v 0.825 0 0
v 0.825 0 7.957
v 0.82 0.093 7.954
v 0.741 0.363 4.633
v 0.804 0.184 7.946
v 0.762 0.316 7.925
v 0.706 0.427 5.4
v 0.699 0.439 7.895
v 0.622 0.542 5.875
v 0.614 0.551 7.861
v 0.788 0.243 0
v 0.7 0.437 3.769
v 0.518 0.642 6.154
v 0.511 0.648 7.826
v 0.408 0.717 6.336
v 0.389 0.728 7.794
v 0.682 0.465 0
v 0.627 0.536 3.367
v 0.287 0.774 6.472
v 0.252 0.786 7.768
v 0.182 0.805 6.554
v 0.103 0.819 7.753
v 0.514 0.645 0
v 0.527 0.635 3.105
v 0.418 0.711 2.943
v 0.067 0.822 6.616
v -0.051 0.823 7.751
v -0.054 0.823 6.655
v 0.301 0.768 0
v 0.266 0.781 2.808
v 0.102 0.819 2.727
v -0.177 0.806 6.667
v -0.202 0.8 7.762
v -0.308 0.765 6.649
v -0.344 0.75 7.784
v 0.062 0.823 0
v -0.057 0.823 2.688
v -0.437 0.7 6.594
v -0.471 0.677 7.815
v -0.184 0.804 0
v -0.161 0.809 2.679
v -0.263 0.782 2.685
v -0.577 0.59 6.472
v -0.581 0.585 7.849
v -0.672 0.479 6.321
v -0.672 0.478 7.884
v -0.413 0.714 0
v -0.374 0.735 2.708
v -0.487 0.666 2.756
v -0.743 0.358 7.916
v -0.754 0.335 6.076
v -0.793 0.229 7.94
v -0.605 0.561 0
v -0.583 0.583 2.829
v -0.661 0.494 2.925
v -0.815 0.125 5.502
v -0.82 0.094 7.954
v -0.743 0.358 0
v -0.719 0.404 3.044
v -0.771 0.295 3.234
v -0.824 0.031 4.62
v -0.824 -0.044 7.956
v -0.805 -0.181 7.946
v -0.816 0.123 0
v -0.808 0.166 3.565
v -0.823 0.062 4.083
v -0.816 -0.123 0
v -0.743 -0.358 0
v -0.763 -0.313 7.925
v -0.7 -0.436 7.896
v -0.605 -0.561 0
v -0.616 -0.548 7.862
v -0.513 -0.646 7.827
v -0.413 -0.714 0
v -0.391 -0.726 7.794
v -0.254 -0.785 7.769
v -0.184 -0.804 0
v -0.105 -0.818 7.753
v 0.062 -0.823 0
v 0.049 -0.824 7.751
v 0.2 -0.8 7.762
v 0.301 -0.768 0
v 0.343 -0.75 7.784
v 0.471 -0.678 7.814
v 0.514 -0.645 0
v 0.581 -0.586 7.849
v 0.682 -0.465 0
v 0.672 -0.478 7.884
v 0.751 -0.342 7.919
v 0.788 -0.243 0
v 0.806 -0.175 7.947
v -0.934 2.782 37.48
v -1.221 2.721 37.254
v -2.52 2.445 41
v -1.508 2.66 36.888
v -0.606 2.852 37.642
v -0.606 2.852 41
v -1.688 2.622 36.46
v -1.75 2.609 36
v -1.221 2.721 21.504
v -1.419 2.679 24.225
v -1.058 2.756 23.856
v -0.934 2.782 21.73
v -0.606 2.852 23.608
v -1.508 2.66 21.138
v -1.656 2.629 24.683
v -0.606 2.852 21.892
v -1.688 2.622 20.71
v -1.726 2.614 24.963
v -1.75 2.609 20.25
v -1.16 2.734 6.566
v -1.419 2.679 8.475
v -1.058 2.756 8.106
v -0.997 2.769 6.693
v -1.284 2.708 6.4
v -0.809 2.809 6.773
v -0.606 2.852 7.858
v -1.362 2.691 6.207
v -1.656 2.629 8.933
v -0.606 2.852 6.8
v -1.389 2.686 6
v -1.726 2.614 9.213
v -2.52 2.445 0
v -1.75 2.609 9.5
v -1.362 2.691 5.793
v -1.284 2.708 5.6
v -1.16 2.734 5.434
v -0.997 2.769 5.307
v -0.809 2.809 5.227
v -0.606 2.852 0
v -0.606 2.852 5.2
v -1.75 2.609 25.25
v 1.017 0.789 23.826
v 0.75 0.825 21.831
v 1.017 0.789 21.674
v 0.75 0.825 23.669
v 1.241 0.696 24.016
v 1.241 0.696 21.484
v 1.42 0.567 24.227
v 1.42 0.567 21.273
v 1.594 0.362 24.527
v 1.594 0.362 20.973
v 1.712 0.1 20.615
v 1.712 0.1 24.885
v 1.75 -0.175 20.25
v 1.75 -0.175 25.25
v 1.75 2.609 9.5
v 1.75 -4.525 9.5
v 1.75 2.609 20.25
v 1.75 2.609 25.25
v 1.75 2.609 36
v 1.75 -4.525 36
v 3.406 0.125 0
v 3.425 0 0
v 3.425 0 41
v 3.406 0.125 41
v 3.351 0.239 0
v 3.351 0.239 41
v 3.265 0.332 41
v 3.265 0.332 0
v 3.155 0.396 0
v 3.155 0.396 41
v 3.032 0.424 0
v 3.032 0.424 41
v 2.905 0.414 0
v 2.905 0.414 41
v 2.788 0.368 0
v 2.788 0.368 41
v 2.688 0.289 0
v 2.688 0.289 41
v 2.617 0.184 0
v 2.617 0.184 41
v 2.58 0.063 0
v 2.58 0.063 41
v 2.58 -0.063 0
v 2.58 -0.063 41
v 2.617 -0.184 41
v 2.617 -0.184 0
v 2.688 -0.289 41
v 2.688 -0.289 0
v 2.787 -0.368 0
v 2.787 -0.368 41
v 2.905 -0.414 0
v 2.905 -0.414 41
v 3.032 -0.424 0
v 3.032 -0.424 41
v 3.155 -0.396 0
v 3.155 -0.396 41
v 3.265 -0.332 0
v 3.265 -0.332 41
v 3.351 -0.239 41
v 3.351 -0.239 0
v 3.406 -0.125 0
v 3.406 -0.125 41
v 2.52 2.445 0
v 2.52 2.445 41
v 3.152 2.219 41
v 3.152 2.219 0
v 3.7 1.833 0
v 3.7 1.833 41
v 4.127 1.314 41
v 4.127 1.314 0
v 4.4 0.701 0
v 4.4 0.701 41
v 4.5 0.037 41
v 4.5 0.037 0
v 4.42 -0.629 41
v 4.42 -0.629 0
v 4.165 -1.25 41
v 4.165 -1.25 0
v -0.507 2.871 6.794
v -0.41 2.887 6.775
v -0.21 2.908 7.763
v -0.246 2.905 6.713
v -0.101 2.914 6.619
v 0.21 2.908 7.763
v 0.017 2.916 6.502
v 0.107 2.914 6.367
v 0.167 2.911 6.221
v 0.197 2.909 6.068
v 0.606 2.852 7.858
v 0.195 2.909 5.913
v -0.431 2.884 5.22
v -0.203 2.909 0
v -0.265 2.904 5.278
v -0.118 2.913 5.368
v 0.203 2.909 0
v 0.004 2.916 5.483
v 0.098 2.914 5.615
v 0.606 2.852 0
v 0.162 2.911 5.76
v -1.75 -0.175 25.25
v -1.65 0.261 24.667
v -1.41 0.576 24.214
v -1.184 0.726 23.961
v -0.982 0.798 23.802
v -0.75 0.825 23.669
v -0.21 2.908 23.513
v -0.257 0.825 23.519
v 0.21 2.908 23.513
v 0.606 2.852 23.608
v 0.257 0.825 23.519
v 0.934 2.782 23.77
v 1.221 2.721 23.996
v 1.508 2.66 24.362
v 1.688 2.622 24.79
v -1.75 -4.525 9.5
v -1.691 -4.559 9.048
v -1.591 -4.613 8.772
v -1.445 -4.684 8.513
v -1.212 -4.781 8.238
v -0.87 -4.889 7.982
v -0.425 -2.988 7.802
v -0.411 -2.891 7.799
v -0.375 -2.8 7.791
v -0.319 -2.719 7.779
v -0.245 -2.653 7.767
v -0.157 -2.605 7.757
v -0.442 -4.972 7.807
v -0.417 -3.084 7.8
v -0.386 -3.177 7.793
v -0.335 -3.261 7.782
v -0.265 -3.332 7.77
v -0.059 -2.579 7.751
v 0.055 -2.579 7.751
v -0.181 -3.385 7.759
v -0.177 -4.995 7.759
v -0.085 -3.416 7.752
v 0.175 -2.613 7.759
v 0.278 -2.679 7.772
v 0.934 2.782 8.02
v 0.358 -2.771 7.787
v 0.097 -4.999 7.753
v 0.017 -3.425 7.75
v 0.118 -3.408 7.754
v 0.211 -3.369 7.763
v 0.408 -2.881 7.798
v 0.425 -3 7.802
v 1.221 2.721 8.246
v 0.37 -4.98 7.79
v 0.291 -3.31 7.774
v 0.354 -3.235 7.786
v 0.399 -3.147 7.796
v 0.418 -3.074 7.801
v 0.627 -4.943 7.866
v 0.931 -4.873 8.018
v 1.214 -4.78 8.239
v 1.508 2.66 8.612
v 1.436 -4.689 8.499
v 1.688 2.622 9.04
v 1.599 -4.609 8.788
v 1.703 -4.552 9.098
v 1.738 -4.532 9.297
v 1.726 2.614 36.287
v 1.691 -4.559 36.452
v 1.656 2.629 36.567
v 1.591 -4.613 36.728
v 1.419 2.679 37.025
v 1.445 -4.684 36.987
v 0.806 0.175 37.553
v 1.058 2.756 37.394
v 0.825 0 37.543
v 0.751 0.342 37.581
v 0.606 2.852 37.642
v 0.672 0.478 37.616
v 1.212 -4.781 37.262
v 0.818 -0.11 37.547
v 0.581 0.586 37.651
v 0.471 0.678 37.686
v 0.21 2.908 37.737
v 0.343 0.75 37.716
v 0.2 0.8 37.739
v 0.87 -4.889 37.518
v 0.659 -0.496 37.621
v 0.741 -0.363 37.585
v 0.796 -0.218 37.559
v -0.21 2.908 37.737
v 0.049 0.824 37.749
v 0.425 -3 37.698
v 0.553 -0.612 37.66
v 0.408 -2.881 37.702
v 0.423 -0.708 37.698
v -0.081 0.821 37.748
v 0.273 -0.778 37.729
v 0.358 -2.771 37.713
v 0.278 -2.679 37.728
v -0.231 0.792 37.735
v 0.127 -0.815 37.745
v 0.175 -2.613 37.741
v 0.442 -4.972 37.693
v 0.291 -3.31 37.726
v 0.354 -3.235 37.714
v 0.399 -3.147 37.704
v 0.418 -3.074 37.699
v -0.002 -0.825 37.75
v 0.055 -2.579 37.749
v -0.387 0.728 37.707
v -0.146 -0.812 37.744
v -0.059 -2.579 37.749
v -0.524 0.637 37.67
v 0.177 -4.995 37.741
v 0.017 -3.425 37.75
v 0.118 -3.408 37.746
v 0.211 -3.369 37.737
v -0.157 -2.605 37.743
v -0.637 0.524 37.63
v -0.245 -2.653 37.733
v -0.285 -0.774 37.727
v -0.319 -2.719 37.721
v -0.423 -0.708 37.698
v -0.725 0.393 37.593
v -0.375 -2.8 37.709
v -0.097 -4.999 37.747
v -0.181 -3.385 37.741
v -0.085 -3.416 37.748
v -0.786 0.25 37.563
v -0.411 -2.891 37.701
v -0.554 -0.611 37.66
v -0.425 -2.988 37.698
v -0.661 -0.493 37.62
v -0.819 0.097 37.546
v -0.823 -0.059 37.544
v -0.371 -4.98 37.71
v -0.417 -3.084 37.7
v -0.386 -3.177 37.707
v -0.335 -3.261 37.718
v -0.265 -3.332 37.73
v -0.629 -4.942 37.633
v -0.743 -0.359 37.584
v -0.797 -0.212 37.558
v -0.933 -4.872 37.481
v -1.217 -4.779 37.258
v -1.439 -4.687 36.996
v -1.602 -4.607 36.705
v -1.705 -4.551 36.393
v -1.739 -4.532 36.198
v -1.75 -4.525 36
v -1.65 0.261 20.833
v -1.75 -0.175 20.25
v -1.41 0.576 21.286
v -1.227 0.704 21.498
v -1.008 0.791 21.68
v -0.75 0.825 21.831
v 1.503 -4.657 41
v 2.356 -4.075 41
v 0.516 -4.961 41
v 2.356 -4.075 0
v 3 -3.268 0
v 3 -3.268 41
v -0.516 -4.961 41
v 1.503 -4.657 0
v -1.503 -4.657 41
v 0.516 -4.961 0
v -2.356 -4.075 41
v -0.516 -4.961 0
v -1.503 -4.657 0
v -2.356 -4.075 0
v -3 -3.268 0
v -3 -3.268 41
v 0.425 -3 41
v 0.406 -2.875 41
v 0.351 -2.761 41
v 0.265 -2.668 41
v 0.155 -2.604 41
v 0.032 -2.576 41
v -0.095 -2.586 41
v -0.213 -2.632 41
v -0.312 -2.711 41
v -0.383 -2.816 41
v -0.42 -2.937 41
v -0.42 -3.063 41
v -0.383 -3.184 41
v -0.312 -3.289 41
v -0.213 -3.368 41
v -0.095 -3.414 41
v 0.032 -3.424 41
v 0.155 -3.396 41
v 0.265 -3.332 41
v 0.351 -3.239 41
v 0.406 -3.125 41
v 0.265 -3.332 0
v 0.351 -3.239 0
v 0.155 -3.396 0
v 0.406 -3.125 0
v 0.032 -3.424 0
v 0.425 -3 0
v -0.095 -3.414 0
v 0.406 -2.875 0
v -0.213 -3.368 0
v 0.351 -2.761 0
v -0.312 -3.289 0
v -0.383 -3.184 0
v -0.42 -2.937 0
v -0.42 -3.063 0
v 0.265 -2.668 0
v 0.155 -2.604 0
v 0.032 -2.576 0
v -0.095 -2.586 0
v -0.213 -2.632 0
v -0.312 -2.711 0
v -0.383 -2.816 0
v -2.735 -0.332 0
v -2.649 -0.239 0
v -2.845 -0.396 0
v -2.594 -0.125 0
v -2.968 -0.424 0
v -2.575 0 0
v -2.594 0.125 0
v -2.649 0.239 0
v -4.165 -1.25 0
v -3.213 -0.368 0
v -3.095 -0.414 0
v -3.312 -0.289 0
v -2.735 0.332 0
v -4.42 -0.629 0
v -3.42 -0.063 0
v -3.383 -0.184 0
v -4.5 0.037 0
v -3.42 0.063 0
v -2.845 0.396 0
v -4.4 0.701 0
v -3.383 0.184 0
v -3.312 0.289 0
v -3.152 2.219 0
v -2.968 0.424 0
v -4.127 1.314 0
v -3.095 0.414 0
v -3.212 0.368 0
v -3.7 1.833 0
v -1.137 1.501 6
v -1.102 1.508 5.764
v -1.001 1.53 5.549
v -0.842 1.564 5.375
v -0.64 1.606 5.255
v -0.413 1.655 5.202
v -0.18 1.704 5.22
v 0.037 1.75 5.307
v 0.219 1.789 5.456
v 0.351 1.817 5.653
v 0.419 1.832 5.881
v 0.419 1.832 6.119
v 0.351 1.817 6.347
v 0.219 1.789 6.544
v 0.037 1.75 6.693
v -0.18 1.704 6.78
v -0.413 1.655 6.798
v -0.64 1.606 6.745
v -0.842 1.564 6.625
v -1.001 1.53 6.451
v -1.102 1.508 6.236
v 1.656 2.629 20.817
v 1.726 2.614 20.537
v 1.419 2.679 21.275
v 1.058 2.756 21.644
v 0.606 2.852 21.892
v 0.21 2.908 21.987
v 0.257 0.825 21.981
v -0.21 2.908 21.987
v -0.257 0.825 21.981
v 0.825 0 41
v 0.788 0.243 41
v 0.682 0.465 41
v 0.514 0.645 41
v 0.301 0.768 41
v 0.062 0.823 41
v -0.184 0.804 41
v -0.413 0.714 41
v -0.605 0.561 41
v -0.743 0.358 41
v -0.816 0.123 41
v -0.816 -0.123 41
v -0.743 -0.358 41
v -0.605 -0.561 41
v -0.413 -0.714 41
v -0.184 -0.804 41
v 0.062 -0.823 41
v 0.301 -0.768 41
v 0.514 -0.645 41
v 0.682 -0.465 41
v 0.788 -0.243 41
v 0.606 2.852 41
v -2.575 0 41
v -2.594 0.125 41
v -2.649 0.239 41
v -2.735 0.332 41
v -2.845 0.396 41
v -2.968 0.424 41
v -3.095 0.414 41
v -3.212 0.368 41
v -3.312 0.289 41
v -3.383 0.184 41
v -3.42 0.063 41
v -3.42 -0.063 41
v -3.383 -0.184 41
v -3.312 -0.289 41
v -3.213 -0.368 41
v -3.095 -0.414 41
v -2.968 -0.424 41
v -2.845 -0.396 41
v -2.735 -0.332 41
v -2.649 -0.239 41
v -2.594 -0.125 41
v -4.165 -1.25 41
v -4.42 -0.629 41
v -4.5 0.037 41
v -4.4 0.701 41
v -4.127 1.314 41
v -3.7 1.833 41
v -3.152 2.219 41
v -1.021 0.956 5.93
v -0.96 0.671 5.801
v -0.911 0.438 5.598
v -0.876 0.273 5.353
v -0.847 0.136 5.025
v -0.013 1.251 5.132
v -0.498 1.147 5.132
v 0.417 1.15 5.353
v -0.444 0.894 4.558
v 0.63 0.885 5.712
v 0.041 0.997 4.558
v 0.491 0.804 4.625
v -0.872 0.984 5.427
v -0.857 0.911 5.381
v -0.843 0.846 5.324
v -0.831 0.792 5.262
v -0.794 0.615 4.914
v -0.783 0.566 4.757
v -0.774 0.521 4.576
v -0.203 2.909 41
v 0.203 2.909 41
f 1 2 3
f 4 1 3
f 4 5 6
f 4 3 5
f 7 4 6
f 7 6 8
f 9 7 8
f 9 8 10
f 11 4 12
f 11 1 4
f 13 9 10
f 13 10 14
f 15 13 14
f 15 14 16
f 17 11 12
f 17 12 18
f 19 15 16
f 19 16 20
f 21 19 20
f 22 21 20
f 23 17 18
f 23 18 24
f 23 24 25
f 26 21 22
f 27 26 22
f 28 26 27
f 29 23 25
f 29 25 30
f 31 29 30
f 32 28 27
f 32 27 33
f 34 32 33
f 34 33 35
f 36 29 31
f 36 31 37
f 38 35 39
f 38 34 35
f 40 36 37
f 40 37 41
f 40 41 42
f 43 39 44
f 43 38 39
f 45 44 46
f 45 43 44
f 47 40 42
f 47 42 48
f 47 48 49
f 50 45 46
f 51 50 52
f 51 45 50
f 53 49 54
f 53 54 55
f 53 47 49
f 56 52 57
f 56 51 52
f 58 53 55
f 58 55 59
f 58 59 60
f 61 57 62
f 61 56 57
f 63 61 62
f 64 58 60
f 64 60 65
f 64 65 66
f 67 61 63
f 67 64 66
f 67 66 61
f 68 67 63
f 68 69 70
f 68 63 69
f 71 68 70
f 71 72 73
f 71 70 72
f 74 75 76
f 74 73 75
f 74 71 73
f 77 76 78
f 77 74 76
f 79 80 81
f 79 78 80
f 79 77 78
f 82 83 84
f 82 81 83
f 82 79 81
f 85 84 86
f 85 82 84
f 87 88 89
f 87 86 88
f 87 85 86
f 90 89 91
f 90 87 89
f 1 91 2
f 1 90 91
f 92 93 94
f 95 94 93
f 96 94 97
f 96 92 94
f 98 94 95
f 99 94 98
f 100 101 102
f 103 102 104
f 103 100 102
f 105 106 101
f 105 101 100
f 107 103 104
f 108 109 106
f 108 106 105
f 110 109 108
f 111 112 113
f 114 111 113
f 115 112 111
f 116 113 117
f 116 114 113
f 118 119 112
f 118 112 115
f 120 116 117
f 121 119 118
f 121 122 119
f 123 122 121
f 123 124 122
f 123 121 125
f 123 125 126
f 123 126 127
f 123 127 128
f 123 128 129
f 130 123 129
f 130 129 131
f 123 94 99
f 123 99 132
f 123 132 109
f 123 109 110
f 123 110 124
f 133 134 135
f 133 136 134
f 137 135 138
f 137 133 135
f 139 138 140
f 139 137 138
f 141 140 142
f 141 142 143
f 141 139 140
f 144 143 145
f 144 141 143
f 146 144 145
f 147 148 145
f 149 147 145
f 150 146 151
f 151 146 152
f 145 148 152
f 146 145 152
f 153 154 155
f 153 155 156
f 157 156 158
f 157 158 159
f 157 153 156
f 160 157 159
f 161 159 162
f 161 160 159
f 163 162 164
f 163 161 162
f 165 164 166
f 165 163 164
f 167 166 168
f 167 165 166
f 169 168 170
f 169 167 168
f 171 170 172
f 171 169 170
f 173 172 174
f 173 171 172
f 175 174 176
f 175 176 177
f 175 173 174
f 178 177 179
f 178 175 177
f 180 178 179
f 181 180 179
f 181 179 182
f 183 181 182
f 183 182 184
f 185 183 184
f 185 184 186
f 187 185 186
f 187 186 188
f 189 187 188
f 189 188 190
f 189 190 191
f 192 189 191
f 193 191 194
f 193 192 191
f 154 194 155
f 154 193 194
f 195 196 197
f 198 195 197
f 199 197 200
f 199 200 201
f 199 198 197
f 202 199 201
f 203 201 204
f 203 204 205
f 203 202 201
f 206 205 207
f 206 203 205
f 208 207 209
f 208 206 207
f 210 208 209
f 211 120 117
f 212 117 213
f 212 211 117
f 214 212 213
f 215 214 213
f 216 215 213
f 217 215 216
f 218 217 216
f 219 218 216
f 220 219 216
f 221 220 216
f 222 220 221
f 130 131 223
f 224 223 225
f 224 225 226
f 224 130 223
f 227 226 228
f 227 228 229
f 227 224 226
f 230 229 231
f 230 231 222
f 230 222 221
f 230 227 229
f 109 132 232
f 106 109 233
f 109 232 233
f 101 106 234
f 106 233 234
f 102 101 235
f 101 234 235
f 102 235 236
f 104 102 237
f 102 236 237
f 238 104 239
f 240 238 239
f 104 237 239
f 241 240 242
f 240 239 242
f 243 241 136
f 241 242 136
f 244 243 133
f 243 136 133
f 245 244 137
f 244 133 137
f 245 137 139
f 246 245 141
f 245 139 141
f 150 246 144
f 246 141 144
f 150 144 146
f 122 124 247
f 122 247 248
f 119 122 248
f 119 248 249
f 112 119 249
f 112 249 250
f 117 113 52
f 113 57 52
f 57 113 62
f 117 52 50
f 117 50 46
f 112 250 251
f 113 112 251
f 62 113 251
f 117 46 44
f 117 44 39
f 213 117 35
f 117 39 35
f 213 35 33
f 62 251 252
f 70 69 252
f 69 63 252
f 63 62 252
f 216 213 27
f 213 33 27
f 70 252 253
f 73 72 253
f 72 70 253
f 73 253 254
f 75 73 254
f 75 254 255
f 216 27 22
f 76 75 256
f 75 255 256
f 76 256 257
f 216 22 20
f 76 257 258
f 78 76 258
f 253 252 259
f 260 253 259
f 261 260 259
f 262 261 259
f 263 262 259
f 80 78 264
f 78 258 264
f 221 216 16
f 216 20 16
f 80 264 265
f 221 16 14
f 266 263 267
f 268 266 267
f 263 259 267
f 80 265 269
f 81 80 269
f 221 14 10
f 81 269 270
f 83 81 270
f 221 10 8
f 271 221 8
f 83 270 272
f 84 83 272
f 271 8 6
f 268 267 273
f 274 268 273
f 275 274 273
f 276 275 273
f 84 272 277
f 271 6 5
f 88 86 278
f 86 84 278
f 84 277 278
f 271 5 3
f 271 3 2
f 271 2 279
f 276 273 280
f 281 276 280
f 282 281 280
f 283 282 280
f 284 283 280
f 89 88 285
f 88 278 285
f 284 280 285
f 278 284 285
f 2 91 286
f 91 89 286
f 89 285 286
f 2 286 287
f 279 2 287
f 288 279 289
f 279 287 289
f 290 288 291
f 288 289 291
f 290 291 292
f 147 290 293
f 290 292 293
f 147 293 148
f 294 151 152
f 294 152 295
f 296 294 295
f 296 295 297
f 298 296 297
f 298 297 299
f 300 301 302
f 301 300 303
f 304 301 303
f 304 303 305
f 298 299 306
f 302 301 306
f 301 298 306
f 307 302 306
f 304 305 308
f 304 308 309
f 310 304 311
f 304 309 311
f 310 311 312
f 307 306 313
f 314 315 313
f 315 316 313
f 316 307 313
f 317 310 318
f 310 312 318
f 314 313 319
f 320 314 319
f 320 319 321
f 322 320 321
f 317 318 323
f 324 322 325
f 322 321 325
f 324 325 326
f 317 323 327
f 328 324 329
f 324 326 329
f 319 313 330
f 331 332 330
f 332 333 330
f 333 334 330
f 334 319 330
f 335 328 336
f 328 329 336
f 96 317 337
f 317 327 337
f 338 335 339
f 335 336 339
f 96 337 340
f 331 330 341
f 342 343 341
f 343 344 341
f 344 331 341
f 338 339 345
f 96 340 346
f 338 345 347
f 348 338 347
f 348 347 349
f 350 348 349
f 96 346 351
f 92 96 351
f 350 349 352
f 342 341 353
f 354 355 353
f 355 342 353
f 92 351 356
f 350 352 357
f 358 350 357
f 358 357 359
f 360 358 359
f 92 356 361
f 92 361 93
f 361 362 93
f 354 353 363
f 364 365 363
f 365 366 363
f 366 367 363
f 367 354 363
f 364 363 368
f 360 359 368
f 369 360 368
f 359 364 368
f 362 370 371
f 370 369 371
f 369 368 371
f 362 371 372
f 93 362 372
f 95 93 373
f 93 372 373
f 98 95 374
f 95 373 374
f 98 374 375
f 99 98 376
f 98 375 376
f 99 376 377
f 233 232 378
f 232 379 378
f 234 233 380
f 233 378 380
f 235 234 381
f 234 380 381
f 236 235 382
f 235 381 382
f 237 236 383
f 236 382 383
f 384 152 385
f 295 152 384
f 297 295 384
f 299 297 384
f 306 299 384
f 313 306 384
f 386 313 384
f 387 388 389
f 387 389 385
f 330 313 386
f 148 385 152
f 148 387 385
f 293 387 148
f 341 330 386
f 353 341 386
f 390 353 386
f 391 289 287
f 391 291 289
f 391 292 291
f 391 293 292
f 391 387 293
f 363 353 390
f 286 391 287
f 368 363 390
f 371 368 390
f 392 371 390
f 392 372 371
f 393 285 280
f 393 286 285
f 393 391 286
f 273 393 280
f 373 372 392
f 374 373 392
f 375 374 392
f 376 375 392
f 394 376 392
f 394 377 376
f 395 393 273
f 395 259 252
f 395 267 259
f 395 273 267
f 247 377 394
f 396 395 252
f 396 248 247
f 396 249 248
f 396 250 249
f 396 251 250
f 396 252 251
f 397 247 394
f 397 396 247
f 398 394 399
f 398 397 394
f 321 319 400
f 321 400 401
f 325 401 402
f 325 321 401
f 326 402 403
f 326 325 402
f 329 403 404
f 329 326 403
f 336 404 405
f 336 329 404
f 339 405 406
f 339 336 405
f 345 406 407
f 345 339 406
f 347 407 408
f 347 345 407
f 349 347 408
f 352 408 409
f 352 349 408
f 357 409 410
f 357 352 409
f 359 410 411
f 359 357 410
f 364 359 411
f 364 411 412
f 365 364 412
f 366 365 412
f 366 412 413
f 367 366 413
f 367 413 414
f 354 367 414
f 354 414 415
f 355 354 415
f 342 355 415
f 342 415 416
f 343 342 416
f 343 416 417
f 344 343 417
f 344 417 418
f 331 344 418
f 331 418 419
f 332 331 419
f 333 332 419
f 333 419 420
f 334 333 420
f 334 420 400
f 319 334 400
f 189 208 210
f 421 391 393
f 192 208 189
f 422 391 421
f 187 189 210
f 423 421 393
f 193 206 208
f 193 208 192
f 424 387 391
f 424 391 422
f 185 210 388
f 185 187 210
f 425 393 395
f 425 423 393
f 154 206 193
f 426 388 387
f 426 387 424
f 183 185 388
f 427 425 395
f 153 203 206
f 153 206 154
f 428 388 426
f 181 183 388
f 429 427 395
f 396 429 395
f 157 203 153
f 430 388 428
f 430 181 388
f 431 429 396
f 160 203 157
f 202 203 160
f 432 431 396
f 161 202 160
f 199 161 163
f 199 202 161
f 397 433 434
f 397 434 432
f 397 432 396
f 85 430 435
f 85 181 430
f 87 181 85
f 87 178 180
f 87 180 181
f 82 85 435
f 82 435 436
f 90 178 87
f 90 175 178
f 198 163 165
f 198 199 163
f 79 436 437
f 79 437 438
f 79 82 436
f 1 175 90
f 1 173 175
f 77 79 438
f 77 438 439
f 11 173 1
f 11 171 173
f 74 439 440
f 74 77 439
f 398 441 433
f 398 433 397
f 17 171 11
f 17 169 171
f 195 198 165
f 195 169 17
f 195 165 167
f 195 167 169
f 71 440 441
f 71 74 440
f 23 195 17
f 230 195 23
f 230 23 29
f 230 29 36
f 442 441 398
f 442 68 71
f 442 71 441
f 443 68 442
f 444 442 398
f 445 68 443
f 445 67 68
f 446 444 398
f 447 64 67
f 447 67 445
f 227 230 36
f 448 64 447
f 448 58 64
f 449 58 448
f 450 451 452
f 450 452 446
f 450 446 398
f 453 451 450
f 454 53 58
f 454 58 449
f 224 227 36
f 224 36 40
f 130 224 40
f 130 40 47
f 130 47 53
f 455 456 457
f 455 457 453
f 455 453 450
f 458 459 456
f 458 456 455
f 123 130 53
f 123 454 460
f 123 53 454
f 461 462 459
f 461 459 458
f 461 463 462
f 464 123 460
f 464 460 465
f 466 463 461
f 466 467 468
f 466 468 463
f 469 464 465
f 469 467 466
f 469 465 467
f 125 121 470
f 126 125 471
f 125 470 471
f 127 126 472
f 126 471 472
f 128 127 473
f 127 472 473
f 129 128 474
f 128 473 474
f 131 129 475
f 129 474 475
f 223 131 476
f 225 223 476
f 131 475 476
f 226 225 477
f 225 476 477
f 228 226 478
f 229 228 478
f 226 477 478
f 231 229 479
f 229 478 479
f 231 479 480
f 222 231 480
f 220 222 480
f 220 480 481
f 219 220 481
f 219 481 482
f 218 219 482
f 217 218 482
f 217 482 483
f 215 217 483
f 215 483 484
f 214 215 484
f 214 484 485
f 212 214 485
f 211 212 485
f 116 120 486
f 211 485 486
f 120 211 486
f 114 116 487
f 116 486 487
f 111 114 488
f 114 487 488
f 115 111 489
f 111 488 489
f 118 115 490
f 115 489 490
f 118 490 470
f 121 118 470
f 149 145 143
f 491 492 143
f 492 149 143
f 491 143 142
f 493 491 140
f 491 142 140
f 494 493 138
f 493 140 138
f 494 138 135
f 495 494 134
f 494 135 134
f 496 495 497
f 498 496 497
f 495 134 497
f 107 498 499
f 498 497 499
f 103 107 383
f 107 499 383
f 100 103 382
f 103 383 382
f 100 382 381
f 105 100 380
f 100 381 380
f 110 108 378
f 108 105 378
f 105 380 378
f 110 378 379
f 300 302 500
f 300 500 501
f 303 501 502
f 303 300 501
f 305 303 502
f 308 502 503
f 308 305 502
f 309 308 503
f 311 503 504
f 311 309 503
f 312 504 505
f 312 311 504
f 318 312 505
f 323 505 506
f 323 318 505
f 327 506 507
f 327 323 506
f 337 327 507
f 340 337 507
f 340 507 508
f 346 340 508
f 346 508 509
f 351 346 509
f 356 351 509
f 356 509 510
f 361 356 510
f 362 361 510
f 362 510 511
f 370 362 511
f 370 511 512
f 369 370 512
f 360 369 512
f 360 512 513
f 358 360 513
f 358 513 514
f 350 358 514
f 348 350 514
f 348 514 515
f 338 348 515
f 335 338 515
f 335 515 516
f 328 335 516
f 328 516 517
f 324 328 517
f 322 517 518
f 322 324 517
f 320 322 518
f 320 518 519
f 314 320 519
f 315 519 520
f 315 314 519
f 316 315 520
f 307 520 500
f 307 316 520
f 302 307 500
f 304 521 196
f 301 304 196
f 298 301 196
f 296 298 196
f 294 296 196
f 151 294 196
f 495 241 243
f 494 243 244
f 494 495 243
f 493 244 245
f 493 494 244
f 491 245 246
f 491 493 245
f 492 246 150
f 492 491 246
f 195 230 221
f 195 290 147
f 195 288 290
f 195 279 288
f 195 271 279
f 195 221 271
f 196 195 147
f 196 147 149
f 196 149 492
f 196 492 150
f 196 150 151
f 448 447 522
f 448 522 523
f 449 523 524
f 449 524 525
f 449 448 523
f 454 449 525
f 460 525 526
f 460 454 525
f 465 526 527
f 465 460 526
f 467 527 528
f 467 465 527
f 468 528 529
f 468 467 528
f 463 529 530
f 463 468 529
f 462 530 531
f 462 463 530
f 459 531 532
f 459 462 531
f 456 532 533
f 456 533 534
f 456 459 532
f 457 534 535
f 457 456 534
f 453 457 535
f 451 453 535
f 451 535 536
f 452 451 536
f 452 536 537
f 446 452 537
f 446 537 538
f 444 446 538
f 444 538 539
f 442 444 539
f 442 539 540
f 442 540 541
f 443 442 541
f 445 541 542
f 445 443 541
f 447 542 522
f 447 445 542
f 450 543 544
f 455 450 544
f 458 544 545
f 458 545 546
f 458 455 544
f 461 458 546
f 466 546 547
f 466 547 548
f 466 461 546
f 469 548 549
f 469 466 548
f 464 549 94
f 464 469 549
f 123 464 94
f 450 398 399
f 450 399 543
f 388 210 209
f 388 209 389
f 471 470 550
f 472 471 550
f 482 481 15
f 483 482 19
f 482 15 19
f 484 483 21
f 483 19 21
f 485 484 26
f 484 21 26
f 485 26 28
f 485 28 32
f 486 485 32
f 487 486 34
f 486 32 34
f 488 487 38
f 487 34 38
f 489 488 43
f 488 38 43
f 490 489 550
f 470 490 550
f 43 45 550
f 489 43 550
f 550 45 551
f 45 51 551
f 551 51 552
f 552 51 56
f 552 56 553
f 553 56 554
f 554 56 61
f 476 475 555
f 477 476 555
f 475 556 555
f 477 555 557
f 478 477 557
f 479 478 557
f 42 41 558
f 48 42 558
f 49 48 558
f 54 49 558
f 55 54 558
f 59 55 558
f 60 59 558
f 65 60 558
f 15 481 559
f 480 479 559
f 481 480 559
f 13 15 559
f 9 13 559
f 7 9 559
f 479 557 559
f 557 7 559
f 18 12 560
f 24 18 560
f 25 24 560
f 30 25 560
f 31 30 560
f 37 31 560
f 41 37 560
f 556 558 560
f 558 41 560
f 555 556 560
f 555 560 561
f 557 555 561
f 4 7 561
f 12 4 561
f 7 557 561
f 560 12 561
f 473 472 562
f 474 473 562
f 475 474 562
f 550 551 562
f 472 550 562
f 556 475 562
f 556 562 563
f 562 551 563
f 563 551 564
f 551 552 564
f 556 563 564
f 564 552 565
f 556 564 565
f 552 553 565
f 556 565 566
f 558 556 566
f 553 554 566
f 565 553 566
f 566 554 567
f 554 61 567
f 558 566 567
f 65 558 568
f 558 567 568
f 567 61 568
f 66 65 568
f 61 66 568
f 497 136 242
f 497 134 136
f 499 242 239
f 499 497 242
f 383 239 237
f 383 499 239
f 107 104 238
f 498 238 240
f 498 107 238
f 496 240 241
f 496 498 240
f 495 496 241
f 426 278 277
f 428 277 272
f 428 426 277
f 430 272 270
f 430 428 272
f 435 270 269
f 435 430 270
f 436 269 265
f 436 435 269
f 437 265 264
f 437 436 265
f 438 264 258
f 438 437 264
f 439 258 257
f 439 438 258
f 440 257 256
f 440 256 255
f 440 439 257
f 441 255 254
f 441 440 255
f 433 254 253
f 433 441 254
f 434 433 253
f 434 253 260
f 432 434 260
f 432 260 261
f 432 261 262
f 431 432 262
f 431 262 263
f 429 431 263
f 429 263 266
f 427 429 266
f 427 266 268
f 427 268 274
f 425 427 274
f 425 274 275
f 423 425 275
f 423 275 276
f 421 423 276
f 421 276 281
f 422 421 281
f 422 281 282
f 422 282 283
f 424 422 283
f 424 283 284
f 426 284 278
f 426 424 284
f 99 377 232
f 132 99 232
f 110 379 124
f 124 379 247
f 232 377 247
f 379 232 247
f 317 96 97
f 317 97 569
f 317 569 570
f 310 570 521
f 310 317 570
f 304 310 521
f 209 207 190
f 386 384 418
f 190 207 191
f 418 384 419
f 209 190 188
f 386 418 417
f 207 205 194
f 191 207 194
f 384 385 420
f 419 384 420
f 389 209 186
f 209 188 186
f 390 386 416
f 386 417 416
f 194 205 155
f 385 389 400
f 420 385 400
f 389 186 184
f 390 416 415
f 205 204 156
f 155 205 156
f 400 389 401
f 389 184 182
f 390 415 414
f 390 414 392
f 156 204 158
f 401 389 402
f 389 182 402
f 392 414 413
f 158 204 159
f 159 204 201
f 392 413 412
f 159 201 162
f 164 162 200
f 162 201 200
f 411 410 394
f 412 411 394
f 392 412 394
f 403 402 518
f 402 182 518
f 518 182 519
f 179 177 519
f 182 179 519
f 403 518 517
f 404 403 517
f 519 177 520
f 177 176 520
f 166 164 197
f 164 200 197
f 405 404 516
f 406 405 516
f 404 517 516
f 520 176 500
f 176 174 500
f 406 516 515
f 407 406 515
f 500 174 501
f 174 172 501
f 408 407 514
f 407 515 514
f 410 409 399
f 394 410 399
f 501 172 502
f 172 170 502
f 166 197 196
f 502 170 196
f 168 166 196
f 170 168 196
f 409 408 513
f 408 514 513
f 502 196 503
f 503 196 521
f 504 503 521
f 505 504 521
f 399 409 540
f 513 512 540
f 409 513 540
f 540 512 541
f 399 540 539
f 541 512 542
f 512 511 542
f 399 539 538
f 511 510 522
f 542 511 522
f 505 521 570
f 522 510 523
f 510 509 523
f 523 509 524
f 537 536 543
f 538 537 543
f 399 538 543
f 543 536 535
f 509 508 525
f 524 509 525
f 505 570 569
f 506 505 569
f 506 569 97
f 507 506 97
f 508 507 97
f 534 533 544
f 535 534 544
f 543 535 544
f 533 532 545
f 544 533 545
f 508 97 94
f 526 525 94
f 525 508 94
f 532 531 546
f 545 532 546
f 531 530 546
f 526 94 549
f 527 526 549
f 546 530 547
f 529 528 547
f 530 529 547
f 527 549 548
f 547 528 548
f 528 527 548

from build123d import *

# Parameters (mm, degrees)
BODYSKE_R       = 0.825
BODYSKE_R_2     = 0.425
BODY_DEPTH      = 41
HOLE_PROFILE_R  = 0.8
CUT1_DEPTH      = 0.825
CUT1_DEPTH_BACK = 42.54816492
CUT2_DEPTH      = 42.548164932
FILLET_2_R      = 1


with BuildPart() as part:
    # BodySke → Body (new body)
    with BuildSketch(Plane.XY):
        with BuildLine():
            Line((4.165063509, -1.25), (3, -3.267949192))
            ThreePointArc((3, -3.267949192), (0, -5), (-3, -3.267949192))
            Line((-3, -3.267949192), (-4.165063509, -1.25))
            ThreePointArc((-4.165063509, -1.25), (-4.283863644, 1.016841608), (-2.519779227, 2.445369002))
            Line((-2.519779227, 2.445369002), (-0.606233769, 2.852105645))
            ThreePointArc((-0.606233769, 2.852105645), (0, 2.915823382), (0.606233769, 2.852105645))
            Line((0.606233769, 2.852105645), (2.519779227, 2.445369002))
            ThreePointArc((2.519779227, 2.445369002), (4.283863644, 1.016841608), (4.165063509, -1.25))
        make_face()
        Circle(BODYSKE_R, mode=Mode.SUBTRACT)
        with Locations((-3, 0)):
            Circle(BODYSKE_R_2, mode=Mode.SUBTRACT)
        with Locations((3, 0)):
            Circle(BODYSKE_R_2, mode=Mode.SUBTRACT)
        with Locations((0, -3)):
            Circle(BODYSKE_R_2, mode=Mode.SUBTRACT)
    extrude(amount=BODY_DEPTH)

    # Hole: sweep along a path in HoleSke
    with BuildLine() as hole_path:  # in the path sketch's own coordinates; laid on its plane below (add() does not lay a ready-made edge on the line's plane)
        Line((6, 2.915823382), (6, 1.704499781))
        add(Edge.make_bspline(
            [(6, 1.704499781), (6, 0.035966381), (4.619948081, 0), (0, 0)],
            knots=[0, 0, 0, 0, 1, 1, 1, 1], degree=3))
    # Hole profile (on start of the path) → Hole (sweep, cut)
    with BuildSketch(Plane(origin=(-0.606233769, 2.852105645, 6), x_dir=(-0.9781476007338055, -0.2079116908177599, 0), z_dir=(0.2079116908177599, -0.9781476007338055, 0))):
        Circle(HOLE_PROFILE_R)
    sweep(path=Plane(origin=(0, 0, 0), x_dir=(0, 0, 1), z_dir=(-0.9781476007338055, -0.2079116908177599, 0)) * hole_path.line, mode=Mode.SUBTRACT)

    # Cut1Ske → Cut1 (cut, two sides: drawn at the far end of the back side and taken through both)
    with BuildSketch(Plane(origin=(0, 0, 0), x_dir=(1, 0, 0), z_dir=(0, 1, 0)).offset(-CUT1_DEPTH_BACK)):
        with BuildLine():
            Line((1.75, -9.5), (1.75, -36))
            ThreePointArc((1.75, -36), (0, -37.75), (-1.75, -36))
            Line((-1.75, -36), (-1.75, -9.5))
            ThreePointArc((-1.75, -9.5), (0, -7.75), (1.75, -9.5))
        make_face()
    extrude(amount=CUT1_DEPTH + CUT1_DEPTH_BACK, mode=Mode.SUBTRACT)

    # Cut2Ske → Cut2 (cut, through all)
    with BuildSketch(Plane(origin=(0, 0, 0), x_dir=(1, 0, 0), z_dir=(0, 1, 0))):
        with BuildLine():
            Line((-1.75, -20.25), (-1.75, -9.5))
            ThreePointArc((-1.75, -9.5), (0, -7.75), (1.75, -9.5))
            Line((1.75, -9.5), (1.75, -20.25))
            ThreePointArc((1.75, -20.25), (0, -22), (-1.75, -20.25))
        make_face()
        with BuildLine():
            Line((1.75, -25.25), (1.75, -36))
            ThreePointArc((1.75, -36), (0, -37.75), (-1.75, -36))
            Line((-1.75, -36), (-1.75, -25.25))
            ThreePointArc((-1.75, -25.25), (0, -23.5), (1.75, -25.25))
        make_face()
    extrude(amount=CUT2_DEPTH, mode=Mode.SUBTRACT)

    # Fillet 2
    fillet_2_edges = [part.edges().sort_by_distance(p)[0] for p in [
        (-1.75, 0.825, 22.75),
        (1.75, 0.825, 22.75),
    ]]
    fillet(fillet_2_edges, radius=FILLET_2_R)


solid = part.part
